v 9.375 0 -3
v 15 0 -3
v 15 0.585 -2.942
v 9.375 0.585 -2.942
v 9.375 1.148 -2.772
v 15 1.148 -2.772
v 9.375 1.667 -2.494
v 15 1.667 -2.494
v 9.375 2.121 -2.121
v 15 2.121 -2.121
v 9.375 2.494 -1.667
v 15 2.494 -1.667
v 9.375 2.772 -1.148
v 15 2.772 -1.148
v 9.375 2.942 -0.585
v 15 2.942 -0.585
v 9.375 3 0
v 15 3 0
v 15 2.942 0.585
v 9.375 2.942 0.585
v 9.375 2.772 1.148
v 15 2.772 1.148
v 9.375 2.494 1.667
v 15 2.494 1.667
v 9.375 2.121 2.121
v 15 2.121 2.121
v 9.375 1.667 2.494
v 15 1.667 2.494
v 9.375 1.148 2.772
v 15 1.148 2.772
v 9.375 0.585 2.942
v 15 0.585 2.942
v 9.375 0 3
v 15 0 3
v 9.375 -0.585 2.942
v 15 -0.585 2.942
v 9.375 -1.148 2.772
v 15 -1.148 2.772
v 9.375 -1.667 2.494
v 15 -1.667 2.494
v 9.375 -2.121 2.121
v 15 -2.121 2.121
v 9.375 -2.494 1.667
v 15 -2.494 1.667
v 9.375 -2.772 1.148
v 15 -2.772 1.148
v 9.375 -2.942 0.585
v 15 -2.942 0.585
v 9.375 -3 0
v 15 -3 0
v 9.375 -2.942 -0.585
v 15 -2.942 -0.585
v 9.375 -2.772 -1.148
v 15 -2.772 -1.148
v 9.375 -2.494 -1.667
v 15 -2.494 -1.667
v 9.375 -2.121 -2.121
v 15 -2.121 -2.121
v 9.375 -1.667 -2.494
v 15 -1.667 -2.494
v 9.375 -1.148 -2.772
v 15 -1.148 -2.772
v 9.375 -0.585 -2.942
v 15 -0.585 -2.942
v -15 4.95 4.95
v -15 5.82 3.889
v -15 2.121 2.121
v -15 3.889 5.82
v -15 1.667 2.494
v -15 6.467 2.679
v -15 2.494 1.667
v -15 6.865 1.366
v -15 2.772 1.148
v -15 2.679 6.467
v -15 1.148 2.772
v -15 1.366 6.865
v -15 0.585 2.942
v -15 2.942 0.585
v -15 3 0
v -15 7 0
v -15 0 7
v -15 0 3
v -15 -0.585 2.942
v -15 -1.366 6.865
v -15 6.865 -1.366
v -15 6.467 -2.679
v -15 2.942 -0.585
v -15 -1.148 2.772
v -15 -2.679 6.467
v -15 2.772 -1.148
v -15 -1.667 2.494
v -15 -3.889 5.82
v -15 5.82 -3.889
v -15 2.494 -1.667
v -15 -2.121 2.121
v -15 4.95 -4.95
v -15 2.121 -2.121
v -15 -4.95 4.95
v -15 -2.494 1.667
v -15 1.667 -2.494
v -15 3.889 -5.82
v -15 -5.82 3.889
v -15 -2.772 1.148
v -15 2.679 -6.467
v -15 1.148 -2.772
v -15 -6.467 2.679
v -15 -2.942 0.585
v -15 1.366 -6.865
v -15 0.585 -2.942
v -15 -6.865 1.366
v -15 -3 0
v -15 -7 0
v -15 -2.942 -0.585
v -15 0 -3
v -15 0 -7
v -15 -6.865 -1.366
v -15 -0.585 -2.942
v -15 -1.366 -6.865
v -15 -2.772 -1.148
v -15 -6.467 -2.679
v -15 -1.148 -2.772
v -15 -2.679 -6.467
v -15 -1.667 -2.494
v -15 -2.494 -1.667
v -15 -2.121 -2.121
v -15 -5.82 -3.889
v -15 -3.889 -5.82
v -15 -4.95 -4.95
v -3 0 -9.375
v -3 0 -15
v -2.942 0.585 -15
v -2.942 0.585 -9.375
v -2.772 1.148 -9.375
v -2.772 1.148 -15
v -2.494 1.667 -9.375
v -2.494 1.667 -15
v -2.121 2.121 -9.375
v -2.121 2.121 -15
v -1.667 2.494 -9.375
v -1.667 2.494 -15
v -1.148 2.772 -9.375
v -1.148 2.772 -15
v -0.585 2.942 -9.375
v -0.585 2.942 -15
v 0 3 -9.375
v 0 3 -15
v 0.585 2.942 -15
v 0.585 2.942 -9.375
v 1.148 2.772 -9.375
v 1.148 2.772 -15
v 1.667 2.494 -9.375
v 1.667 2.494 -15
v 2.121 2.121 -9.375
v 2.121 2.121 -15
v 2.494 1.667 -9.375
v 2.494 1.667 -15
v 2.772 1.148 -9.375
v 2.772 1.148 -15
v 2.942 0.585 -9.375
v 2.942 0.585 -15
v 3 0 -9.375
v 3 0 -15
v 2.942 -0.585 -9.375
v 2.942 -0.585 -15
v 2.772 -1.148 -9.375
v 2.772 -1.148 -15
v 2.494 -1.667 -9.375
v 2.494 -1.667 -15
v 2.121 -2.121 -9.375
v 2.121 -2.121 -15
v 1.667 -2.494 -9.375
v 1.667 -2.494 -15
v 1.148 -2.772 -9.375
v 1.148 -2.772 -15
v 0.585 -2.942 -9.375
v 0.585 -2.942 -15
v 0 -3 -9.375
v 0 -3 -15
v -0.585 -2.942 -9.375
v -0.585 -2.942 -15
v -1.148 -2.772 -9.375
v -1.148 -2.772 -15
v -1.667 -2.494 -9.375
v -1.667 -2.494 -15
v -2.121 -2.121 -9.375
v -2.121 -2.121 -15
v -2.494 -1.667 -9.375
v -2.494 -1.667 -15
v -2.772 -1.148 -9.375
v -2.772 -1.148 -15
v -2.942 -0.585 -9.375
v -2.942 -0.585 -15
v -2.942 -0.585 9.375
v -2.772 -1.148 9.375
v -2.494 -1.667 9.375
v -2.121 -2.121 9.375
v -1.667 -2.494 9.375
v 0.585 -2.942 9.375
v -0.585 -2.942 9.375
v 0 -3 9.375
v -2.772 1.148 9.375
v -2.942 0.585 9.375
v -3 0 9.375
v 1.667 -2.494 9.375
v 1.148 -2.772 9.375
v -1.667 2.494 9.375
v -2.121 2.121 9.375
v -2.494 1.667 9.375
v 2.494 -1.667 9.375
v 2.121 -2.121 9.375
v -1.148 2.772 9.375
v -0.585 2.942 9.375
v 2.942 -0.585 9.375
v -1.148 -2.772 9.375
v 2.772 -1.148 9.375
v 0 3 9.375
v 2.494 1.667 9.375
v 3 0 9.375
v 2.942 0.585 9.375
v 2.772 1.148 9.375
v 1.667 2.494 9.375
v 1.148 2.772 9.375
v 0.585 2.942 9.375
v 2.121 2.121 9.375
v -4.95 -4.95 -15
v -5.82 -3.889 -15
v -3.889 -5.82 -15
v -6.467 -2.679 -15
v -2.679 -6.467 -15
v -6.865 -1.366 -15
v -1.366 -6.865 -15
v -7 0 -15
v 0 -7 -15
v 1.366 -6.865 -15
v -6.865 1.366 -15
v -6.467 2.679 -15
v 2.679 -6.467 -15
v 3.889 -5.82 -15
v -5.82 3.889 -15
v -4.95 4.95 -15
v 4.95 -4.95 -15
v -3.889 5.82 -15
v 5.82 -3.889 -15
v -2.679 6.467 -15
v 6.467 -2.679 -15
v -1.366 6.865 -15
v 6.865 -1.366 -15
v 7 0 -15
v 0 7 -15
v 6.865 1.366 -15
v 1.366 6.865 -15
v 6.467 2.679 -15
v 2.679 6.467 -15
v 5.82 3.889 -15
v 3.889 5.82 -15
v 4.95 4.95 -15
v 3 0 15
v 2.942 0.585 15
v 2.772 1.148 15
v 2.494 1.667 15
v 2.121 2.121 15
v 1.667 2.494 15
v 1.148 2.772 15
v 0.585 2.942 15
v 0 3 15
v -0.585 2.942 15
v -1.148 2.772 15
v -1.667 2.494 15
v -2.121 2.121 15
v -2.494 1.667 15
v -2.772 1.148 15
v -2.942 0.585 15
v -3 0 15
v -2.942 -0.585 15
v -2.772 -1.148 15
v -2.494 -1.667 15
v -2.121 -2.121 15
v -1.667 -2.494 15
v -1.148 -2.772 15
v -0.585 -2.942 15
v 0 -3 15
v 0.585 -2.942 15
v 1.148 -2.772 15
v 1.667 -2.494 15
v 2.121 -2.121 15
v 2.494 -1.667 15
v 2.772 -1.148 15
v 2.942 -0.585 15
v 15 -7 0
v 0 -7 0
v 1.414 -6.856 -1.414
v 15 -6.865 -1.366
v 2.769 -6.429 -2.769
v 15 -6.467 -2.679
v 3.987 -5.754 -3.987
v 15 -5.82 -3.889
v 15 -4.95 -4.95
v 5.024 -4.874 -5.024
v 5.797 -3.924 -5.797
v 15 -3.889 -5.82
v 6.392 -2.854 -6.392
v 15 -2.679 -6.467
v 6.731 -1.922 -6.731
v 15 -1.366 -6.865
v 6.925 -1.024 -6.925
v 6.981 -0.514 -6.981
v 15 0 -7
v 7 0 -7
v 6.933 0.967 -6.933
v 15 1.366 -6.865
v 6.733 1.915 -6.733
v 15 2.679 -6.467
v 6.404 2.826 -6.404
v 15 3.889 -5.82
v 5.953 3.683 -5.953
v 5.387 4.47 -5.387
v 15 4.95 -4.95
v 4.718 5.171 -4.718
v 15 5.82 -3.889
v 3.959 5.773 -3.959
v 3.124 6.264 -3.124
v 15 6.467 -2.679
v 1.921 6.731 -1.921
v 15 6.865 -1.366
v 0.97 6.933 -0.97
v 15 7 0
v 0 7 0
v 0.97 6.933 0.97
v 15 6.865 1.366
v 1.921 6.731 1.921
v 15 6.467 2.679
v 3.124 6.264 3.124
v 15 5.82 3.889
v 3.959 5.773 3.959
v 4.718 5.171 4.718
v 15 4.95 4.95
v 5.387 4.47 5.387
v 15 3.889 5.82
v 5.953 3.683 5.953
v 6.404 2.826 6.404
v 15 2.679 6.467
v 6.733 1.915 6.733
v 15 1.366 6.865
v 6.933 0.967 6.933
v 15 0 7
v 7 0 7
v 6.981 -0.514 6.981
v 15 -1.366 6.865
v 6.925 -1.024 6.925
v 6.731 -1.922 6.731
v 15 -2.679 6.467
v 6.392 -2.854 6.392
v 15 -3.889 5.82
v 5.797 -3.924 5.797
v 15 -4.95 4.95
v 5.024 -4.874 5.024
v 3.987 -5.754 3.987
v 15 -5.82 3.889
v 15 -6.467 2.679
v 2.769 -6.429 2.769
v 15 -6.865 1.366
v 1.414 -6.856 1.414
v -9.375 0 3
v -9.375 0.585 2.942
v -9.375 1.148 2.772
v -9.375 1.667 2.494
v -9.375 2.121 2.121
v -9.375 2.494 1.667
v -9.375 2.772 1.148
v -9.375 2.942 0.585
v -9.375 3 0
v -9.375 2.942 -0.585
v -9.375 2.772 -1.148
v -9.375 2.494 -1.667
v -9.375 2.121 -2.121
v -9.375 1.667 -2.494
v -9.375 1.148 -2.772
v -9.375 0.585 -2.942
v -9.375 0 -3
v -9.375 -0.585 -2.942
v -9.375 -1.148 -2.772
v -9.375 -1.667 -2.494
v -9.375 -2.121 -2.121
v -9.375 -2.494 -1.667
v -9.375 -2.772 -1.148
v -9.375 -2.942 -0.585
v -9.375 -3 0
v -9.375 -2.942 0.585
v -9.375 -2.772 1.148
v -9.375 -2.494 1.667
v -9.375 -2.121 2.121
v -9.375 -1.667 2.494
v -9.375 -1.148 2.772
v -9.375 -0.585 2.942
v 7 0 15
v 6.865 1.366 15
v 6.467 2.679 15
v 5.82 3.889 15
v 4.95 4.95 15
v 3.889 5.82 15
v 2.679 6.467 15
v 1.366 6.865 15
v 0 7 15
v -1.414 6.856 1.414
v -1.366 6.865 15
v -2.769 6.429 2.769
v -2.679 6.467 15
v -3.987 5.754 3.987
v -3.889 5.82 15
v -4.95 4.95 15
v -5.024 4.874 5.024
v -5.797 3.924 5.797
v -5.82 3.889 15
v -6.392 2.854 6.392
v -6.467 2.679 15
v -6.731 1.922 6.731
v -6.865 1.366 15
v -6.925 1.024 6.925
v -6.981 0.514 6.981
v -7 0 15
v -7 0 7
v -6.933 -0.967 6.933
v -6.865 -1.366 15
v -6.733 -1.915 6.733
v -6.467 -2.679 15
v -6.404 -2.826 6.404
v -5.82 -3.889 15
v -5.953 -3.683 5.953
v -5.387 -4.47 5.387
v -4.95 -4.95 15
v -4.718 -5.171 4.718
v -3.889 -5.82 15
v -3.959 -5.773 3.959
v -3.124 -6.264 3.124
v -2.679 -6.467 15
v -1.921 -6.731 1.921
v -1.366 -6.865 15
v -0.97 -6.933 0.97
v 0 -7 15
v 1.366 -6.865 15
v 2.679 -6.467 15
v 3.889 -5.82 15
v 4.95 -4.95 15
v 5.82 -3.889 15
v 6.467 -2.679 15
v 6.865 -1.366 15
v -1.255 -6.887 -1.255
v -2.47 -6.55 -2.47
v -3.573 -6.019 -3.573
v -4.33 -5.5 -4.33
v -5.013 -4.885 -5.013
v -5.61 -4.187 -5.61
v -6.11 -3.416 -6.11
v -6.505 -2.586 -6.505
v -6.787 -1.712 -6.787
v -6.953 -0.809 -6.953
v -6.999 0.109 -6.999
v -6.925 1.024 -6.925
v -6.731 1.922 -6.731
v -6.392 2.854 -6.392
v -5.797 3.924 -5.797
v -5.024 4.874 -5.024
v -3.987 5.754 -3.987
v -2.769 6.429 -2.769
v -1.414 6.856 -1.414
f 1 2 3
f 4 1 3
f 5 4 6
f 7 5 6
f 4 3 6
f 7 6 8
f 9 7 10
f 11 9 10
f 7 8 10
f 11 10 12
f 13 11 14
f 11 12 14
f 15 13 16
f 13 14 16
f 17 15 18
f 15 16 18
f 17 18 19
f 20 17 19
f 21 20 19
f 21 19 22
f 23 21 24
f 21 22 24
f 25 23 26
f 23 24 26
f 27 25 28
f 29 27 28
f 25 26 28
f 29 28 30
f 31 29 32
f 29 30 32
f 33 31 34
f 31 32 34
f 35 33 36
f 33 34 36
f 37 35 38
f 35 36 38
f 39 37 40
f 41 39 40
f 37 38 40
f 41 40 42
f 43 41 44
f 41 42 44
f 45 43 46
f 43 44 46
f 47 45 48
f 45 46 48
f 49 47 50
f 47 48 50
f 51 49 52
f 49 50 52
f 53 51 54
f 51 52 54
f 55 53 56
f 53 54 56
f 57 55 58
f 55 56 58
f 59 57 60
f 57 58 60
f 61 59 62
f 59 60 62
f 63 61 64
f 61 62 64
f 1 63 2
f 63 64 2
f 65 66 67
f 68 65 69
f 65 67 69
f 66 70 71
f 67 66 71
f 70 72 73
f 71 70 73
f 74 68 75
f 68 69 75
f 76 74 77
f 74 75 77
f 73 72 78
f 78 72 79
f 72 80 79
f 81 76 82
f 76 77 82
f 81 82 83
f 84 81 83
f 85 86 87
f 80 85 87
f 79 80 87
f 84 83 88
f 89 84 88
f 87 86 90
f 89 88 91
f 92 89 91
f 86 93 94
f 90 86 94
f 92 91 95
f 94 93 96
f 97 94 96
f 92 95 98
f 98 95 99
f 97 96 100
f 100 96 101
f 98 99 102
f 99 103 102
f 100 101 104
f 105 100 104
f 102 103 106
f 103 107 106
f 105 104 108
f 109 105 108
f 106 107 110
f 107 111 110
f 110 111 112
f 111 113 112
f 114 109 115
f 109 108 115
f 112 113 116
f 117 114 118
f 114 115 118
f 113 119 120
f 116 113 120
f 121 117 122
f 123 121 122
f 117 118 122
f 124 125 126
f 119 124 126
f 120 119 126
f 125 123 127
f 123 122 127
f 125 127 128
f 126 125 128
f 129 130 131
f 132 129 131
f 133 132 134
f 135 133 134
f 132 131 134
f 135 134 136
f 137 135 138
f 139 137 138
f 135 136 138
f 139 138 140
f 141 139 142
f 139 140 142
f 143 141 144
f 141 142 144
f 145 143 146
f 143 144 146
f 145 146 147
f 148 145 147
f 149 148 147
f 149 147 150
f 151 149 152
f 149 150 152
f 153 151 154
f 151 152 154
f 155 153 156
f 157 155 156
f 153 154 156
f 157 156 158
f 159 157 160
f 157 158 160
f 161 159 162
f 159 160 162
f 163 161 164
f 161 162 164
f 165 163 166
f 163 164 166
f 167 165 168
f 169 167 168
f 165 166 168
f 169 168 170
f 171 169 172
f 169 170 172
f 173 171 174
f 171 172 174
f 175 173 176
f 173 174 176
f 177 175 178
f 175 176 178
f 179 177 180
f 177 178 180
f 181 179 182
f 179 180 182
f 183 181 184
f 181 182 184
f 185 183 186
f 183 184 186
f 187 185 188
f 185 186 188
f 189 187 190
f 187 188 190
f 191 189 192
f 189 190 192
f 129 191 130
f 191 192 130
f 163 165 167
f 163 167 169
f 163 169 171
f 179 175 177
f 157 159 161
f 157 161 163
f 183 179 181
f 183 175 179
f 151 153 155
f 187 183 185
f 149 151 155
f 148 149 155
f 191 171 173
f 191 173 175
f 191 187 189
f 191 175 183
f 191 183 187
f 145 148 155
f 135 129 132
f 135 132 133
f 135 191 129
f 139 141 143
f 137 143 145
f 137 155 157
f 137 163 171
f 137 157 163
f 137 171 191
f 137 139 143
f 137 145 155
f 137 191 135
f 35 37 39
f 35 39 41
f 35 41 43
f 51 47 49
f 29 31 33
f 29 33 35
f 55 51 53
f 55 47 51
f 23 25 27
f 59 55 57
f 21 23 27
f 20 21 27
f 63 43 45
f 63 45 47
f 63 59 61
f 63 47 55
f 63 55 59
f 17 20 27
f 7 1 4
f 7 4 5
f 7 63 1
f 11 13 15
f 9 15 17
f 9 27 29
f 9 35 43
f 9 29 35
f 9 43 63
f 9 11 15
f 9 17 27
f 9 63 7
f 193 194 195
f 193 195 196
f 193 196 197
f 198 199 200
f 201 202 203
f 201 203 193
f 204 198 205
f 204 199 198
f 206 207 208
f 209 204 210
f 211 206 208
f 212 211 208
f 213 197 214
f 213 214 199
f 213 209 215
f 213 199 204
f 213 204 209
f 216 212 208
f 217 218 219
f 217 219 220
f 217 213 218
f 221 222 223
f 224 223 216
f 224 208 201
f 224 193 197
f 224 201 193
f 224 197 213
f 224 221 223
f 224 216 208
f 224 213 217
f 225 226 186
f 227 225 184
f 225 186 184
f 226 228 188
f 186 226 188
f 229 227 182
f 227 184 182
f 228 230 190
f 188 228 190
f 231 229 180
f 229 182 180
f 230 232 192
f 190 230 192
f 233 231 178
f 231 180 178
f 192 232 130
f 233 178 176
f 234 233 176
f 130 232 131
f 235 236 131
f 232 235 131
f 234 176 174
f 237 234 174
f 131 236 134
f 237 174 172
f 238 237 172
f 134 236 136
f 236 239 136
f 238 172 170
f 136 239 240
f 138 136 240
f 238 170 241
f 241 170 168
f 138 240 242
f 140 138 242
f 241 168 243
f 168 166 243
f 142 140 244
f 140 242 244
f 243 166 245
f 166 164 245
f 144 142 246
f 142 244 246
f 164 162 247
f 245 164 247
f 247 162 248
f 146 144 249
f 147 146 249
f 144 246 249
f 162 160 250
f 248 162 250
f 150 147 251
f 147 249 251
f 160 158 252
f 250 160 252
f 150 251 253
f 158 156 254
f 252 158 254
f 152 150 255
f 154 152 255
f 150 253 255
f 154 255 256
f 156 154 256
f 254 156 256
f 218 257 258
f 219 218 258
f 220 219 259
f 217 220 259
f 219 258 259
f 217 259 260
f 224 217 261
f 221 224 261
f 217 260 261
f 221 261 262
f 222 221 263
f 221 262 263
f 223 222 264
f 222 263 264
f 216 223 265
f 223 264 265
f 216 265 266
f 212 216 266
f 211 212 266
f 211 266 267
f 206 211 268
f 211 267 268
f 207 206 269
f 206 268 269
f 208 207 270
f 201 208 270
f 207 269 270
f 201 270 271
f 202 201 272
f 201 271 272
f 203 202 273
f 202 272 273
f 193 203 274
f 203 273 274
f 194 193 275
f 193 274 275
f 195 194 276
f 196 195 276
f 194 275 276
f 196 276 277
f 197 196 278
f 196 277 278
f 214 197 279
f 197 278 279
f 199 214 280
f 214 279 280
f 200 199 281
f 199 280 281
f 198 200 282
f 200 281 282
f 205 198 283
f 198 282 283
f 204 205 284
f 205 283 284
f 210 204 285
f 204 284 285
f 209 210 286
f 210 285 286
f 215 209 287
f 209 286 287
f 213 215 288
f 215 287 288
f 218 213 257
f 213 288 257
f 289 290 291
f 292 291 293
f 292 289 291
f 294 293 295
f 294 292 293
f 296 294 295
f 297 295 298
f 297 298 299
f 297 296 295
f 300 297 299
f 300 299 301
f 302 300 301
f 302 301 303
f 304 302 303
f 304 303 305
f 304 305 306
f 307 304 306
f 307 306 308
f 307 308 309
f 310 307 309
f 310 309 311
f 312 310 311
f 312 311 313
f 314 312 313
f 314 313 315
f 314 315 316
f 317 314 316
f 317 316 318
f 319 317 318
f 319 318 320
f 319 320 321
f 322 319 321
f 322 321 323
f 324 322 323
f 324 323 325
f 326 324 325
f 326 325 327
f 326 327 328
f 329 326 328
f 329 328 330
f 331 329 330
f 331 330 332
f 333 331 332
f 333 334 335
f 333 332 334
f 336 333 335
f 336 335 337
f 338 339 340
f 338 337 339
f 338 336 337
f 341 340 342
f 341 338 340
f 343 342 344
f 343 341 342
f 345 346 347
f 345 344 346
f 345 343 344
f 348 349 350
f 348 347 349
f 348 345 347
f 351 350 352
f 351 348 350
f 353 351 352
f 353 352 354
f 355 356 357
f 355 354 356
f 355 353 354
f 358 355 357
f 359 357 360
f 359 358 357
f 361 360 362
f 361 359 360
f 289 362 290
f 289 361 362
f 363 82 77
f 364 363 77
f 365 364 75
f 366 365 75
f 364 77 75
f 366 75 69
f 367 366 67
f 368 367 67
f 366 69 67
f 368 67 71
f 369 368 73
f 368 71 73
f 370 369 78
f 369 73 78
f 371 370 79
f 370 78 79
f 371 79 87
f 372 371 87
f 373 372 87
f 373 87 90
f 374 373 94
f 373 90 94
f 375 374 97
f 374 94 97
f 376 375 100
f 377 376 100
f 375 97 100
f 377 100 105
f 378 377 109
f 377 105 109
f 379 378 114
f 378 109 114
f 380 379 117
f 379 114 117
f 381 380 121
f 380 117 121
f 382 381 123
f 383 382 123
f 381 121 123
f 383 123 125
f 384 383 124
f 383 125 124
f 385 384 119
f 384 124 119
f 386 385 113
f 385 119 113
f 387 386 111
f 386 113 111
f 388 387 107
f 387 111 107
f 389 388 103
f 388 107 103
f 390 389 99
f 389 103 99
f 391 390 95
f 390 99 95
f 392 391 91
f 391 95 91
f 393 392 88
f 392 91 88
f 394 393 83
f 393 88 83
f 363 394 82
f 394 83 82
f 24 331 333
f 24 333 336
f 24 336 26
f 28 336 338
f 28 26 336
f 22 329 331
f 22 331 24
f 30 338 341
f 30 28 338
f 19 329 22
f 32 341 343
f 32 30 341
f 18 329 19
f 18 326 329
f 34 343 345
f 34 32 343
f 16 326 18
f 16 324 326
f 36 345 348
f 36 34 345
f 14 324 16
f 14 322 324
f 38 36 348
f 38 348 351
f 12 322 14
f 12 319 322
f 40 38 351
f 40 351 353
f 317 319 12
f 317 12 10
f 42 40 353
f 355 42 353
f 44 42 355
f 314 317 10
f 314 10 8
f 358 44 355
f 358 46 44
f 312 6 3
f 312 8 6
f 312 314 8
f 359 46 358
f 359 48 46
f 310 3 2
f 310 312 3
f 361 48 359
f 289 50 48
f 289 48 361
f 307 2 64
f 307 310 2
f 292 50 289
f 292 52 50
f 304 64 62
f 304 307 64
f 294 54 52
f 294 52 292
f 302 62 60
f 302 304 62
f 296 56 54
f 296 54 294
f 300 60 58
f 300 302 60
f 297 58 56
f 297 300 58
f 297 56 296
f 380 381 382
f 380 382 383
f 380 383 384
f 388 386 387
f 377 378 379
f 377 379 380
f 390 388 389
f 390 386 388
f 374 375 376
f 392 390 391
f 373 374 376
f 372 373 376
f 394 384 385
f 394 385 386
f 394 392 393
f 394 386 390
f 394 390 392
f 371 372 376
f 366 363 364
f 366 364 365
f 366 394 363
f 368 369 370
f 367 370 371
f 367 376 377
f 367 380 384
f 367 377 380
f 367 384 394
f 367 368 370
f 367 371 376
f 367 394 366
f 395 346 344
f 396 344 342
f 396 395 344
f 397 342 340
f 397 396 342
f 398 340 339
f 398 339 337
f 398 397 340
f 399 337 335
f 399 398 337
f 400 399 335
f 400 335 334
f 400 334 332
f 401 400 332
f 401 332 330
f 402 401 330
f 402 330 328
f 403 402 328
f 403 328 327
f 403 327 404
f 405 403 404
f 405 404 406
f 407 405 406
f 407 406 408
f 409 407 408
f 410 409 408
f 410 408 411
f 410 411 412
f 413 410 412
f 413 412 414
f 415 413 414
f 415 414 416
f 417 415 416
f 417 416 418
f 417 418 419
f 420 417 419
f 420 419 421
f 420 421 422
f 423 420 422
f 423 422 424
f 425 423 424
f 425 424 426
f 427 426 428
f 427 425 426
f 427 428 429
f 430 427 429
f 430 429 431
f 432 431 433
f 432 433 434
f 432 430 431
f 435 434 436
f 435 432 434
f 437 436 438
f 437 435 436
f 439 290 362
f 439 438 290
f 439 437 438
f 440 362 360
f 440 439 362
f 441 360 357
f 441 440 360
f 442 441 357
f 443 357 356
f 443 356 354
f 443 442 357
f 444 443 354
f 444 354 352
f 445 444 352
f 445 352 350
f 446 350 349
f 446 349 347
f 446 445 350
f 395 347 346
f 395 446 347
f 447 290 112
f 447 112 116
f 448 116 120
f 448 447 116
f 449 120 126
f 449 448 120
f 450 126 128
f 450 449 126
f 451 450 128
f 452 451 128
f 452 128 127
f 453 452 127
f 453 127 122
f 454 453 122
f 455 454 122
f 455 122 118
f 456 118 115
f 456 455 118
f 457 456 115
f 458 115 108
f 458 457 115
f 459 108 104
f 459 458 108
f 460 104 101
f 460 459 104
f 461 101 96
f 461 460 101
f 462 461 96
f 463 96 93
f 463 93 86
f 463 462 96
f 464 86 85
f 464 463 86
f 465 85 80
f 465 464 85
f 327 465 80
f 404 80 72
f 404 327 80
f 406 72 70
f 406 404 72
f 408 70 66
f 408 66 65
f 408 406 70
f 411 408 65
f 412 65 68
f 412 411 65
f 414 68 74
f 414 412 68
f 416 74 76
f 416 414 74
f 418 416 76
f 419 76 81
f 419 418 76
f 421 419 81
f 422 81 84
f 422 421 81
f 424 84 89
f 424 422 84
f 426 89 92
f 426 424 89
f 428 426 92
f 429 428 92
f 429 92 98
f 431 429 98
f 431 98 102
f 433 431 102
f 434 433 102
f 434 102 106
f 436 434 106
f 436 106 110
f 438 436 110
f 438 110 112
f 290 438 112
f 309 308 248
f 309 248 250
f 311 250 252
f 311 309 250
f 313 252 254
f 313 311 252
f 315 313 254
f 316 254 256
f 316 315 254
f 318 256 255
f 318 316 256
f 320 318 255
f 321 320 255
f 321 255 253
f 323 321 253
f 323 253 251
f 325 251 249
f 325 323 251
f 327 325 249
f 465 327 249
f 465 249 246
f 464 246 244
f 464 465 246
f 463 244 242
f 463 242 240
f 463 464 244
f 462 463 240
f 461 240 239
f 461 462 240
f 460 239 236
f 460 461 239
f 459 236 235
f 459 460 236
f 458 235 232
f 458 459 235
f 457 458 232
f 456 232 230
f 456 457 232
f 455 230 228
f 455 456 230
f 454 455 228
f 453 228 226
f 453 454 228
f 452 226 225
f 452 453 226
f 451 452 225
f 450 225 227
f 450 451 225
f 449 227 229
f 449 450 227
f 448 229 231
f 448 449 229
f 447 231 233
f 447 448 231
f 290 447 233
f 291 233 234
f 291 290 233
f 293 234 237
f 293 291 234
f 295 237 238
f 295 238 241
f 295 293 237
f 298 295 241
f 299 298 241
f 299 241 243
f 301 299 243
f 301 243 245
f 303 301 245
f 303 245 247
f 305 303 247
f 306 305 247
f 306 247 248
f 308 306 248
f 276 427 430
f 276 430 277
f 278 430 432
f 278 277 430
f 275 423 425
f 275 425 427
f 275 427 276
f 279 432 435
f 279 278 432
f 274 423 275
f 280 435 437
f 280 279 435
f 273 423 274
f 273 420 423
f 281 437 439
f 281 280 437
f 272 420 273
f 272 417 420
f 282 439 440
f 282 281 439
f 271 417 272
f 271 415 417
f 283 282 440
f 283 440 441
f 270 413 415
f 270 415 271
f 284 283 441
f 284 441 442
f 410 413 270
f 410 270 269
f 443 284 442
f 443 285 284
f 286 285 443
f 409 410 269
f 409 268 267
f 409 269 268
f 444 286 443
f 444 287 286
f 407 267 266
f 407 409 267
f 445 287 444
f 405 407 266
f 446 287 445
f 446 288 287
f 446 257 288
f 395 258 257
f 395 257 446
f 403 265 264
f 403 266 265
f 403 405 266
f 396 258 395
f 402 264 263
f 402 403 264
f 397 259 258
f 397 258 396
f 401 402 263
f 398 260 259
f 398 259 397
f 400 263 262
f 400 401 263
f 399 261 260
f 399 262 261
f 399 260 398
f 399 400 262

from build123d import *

# Parameters (mm, degrees)
SKETCH1_R           = 7
BOSS_EXTRUDE1_DEPTH = 15
SKETCH4_R           = 7
BOSS_EXTRUDE2_DEPTH = 15
SKETCH3_R           = 3
CUT_EXTRUDE1_DEPTH  = 5.625
CIRPATTERN1_COUNT   = 4


with BuildPart() as part:
    # Sketch1 → Boss-Extrude1 (new, symmetric)
    with BuildSketch(Plane.XY):
        Circle(SKETCH1_R)
    extrude(amount=BOSS_EXTRUDE1_DEPTH, both=True)

    # Sketch4 → Boss-Extrude2 (add, symmetric)
    with BuildSketch(Plane(origin=(0, 0, 0), x_dir=(0, 0, -1), z_dir=(1, 0, 0))):
        with Locations(Location((0, 0, 0), (0, 0, 270))):
            Circle(SKETCH4_R)
    extrude(amount=BOSS_EXTRUDE2_DEPTH, both=True)

    # Sketch3 → Cut-Extrude1 (cut)
    with BuildSketch(Plane.XY.offset(15)):
        Circle(SKETCH3_R)
    cut_extrude1 = extrude(amount=-CUT_EXTRUDE1_DEPTH, mode=Mode.SUBTRACT)

    # CirPattern1: Cut-Extrude1 ×4 about axis
    cirpattern1_axis = Axis((0, 0, 0), (0, 1, 0))
    for i in range(1, CIRPATTERN1_COUNT):
        add(cut_extrude1.rotate(cirpattern1_axis, i * 360 / CIRPATTERN1_COUNT), mode=Mode.SUBTRACT)


solid = part.part
